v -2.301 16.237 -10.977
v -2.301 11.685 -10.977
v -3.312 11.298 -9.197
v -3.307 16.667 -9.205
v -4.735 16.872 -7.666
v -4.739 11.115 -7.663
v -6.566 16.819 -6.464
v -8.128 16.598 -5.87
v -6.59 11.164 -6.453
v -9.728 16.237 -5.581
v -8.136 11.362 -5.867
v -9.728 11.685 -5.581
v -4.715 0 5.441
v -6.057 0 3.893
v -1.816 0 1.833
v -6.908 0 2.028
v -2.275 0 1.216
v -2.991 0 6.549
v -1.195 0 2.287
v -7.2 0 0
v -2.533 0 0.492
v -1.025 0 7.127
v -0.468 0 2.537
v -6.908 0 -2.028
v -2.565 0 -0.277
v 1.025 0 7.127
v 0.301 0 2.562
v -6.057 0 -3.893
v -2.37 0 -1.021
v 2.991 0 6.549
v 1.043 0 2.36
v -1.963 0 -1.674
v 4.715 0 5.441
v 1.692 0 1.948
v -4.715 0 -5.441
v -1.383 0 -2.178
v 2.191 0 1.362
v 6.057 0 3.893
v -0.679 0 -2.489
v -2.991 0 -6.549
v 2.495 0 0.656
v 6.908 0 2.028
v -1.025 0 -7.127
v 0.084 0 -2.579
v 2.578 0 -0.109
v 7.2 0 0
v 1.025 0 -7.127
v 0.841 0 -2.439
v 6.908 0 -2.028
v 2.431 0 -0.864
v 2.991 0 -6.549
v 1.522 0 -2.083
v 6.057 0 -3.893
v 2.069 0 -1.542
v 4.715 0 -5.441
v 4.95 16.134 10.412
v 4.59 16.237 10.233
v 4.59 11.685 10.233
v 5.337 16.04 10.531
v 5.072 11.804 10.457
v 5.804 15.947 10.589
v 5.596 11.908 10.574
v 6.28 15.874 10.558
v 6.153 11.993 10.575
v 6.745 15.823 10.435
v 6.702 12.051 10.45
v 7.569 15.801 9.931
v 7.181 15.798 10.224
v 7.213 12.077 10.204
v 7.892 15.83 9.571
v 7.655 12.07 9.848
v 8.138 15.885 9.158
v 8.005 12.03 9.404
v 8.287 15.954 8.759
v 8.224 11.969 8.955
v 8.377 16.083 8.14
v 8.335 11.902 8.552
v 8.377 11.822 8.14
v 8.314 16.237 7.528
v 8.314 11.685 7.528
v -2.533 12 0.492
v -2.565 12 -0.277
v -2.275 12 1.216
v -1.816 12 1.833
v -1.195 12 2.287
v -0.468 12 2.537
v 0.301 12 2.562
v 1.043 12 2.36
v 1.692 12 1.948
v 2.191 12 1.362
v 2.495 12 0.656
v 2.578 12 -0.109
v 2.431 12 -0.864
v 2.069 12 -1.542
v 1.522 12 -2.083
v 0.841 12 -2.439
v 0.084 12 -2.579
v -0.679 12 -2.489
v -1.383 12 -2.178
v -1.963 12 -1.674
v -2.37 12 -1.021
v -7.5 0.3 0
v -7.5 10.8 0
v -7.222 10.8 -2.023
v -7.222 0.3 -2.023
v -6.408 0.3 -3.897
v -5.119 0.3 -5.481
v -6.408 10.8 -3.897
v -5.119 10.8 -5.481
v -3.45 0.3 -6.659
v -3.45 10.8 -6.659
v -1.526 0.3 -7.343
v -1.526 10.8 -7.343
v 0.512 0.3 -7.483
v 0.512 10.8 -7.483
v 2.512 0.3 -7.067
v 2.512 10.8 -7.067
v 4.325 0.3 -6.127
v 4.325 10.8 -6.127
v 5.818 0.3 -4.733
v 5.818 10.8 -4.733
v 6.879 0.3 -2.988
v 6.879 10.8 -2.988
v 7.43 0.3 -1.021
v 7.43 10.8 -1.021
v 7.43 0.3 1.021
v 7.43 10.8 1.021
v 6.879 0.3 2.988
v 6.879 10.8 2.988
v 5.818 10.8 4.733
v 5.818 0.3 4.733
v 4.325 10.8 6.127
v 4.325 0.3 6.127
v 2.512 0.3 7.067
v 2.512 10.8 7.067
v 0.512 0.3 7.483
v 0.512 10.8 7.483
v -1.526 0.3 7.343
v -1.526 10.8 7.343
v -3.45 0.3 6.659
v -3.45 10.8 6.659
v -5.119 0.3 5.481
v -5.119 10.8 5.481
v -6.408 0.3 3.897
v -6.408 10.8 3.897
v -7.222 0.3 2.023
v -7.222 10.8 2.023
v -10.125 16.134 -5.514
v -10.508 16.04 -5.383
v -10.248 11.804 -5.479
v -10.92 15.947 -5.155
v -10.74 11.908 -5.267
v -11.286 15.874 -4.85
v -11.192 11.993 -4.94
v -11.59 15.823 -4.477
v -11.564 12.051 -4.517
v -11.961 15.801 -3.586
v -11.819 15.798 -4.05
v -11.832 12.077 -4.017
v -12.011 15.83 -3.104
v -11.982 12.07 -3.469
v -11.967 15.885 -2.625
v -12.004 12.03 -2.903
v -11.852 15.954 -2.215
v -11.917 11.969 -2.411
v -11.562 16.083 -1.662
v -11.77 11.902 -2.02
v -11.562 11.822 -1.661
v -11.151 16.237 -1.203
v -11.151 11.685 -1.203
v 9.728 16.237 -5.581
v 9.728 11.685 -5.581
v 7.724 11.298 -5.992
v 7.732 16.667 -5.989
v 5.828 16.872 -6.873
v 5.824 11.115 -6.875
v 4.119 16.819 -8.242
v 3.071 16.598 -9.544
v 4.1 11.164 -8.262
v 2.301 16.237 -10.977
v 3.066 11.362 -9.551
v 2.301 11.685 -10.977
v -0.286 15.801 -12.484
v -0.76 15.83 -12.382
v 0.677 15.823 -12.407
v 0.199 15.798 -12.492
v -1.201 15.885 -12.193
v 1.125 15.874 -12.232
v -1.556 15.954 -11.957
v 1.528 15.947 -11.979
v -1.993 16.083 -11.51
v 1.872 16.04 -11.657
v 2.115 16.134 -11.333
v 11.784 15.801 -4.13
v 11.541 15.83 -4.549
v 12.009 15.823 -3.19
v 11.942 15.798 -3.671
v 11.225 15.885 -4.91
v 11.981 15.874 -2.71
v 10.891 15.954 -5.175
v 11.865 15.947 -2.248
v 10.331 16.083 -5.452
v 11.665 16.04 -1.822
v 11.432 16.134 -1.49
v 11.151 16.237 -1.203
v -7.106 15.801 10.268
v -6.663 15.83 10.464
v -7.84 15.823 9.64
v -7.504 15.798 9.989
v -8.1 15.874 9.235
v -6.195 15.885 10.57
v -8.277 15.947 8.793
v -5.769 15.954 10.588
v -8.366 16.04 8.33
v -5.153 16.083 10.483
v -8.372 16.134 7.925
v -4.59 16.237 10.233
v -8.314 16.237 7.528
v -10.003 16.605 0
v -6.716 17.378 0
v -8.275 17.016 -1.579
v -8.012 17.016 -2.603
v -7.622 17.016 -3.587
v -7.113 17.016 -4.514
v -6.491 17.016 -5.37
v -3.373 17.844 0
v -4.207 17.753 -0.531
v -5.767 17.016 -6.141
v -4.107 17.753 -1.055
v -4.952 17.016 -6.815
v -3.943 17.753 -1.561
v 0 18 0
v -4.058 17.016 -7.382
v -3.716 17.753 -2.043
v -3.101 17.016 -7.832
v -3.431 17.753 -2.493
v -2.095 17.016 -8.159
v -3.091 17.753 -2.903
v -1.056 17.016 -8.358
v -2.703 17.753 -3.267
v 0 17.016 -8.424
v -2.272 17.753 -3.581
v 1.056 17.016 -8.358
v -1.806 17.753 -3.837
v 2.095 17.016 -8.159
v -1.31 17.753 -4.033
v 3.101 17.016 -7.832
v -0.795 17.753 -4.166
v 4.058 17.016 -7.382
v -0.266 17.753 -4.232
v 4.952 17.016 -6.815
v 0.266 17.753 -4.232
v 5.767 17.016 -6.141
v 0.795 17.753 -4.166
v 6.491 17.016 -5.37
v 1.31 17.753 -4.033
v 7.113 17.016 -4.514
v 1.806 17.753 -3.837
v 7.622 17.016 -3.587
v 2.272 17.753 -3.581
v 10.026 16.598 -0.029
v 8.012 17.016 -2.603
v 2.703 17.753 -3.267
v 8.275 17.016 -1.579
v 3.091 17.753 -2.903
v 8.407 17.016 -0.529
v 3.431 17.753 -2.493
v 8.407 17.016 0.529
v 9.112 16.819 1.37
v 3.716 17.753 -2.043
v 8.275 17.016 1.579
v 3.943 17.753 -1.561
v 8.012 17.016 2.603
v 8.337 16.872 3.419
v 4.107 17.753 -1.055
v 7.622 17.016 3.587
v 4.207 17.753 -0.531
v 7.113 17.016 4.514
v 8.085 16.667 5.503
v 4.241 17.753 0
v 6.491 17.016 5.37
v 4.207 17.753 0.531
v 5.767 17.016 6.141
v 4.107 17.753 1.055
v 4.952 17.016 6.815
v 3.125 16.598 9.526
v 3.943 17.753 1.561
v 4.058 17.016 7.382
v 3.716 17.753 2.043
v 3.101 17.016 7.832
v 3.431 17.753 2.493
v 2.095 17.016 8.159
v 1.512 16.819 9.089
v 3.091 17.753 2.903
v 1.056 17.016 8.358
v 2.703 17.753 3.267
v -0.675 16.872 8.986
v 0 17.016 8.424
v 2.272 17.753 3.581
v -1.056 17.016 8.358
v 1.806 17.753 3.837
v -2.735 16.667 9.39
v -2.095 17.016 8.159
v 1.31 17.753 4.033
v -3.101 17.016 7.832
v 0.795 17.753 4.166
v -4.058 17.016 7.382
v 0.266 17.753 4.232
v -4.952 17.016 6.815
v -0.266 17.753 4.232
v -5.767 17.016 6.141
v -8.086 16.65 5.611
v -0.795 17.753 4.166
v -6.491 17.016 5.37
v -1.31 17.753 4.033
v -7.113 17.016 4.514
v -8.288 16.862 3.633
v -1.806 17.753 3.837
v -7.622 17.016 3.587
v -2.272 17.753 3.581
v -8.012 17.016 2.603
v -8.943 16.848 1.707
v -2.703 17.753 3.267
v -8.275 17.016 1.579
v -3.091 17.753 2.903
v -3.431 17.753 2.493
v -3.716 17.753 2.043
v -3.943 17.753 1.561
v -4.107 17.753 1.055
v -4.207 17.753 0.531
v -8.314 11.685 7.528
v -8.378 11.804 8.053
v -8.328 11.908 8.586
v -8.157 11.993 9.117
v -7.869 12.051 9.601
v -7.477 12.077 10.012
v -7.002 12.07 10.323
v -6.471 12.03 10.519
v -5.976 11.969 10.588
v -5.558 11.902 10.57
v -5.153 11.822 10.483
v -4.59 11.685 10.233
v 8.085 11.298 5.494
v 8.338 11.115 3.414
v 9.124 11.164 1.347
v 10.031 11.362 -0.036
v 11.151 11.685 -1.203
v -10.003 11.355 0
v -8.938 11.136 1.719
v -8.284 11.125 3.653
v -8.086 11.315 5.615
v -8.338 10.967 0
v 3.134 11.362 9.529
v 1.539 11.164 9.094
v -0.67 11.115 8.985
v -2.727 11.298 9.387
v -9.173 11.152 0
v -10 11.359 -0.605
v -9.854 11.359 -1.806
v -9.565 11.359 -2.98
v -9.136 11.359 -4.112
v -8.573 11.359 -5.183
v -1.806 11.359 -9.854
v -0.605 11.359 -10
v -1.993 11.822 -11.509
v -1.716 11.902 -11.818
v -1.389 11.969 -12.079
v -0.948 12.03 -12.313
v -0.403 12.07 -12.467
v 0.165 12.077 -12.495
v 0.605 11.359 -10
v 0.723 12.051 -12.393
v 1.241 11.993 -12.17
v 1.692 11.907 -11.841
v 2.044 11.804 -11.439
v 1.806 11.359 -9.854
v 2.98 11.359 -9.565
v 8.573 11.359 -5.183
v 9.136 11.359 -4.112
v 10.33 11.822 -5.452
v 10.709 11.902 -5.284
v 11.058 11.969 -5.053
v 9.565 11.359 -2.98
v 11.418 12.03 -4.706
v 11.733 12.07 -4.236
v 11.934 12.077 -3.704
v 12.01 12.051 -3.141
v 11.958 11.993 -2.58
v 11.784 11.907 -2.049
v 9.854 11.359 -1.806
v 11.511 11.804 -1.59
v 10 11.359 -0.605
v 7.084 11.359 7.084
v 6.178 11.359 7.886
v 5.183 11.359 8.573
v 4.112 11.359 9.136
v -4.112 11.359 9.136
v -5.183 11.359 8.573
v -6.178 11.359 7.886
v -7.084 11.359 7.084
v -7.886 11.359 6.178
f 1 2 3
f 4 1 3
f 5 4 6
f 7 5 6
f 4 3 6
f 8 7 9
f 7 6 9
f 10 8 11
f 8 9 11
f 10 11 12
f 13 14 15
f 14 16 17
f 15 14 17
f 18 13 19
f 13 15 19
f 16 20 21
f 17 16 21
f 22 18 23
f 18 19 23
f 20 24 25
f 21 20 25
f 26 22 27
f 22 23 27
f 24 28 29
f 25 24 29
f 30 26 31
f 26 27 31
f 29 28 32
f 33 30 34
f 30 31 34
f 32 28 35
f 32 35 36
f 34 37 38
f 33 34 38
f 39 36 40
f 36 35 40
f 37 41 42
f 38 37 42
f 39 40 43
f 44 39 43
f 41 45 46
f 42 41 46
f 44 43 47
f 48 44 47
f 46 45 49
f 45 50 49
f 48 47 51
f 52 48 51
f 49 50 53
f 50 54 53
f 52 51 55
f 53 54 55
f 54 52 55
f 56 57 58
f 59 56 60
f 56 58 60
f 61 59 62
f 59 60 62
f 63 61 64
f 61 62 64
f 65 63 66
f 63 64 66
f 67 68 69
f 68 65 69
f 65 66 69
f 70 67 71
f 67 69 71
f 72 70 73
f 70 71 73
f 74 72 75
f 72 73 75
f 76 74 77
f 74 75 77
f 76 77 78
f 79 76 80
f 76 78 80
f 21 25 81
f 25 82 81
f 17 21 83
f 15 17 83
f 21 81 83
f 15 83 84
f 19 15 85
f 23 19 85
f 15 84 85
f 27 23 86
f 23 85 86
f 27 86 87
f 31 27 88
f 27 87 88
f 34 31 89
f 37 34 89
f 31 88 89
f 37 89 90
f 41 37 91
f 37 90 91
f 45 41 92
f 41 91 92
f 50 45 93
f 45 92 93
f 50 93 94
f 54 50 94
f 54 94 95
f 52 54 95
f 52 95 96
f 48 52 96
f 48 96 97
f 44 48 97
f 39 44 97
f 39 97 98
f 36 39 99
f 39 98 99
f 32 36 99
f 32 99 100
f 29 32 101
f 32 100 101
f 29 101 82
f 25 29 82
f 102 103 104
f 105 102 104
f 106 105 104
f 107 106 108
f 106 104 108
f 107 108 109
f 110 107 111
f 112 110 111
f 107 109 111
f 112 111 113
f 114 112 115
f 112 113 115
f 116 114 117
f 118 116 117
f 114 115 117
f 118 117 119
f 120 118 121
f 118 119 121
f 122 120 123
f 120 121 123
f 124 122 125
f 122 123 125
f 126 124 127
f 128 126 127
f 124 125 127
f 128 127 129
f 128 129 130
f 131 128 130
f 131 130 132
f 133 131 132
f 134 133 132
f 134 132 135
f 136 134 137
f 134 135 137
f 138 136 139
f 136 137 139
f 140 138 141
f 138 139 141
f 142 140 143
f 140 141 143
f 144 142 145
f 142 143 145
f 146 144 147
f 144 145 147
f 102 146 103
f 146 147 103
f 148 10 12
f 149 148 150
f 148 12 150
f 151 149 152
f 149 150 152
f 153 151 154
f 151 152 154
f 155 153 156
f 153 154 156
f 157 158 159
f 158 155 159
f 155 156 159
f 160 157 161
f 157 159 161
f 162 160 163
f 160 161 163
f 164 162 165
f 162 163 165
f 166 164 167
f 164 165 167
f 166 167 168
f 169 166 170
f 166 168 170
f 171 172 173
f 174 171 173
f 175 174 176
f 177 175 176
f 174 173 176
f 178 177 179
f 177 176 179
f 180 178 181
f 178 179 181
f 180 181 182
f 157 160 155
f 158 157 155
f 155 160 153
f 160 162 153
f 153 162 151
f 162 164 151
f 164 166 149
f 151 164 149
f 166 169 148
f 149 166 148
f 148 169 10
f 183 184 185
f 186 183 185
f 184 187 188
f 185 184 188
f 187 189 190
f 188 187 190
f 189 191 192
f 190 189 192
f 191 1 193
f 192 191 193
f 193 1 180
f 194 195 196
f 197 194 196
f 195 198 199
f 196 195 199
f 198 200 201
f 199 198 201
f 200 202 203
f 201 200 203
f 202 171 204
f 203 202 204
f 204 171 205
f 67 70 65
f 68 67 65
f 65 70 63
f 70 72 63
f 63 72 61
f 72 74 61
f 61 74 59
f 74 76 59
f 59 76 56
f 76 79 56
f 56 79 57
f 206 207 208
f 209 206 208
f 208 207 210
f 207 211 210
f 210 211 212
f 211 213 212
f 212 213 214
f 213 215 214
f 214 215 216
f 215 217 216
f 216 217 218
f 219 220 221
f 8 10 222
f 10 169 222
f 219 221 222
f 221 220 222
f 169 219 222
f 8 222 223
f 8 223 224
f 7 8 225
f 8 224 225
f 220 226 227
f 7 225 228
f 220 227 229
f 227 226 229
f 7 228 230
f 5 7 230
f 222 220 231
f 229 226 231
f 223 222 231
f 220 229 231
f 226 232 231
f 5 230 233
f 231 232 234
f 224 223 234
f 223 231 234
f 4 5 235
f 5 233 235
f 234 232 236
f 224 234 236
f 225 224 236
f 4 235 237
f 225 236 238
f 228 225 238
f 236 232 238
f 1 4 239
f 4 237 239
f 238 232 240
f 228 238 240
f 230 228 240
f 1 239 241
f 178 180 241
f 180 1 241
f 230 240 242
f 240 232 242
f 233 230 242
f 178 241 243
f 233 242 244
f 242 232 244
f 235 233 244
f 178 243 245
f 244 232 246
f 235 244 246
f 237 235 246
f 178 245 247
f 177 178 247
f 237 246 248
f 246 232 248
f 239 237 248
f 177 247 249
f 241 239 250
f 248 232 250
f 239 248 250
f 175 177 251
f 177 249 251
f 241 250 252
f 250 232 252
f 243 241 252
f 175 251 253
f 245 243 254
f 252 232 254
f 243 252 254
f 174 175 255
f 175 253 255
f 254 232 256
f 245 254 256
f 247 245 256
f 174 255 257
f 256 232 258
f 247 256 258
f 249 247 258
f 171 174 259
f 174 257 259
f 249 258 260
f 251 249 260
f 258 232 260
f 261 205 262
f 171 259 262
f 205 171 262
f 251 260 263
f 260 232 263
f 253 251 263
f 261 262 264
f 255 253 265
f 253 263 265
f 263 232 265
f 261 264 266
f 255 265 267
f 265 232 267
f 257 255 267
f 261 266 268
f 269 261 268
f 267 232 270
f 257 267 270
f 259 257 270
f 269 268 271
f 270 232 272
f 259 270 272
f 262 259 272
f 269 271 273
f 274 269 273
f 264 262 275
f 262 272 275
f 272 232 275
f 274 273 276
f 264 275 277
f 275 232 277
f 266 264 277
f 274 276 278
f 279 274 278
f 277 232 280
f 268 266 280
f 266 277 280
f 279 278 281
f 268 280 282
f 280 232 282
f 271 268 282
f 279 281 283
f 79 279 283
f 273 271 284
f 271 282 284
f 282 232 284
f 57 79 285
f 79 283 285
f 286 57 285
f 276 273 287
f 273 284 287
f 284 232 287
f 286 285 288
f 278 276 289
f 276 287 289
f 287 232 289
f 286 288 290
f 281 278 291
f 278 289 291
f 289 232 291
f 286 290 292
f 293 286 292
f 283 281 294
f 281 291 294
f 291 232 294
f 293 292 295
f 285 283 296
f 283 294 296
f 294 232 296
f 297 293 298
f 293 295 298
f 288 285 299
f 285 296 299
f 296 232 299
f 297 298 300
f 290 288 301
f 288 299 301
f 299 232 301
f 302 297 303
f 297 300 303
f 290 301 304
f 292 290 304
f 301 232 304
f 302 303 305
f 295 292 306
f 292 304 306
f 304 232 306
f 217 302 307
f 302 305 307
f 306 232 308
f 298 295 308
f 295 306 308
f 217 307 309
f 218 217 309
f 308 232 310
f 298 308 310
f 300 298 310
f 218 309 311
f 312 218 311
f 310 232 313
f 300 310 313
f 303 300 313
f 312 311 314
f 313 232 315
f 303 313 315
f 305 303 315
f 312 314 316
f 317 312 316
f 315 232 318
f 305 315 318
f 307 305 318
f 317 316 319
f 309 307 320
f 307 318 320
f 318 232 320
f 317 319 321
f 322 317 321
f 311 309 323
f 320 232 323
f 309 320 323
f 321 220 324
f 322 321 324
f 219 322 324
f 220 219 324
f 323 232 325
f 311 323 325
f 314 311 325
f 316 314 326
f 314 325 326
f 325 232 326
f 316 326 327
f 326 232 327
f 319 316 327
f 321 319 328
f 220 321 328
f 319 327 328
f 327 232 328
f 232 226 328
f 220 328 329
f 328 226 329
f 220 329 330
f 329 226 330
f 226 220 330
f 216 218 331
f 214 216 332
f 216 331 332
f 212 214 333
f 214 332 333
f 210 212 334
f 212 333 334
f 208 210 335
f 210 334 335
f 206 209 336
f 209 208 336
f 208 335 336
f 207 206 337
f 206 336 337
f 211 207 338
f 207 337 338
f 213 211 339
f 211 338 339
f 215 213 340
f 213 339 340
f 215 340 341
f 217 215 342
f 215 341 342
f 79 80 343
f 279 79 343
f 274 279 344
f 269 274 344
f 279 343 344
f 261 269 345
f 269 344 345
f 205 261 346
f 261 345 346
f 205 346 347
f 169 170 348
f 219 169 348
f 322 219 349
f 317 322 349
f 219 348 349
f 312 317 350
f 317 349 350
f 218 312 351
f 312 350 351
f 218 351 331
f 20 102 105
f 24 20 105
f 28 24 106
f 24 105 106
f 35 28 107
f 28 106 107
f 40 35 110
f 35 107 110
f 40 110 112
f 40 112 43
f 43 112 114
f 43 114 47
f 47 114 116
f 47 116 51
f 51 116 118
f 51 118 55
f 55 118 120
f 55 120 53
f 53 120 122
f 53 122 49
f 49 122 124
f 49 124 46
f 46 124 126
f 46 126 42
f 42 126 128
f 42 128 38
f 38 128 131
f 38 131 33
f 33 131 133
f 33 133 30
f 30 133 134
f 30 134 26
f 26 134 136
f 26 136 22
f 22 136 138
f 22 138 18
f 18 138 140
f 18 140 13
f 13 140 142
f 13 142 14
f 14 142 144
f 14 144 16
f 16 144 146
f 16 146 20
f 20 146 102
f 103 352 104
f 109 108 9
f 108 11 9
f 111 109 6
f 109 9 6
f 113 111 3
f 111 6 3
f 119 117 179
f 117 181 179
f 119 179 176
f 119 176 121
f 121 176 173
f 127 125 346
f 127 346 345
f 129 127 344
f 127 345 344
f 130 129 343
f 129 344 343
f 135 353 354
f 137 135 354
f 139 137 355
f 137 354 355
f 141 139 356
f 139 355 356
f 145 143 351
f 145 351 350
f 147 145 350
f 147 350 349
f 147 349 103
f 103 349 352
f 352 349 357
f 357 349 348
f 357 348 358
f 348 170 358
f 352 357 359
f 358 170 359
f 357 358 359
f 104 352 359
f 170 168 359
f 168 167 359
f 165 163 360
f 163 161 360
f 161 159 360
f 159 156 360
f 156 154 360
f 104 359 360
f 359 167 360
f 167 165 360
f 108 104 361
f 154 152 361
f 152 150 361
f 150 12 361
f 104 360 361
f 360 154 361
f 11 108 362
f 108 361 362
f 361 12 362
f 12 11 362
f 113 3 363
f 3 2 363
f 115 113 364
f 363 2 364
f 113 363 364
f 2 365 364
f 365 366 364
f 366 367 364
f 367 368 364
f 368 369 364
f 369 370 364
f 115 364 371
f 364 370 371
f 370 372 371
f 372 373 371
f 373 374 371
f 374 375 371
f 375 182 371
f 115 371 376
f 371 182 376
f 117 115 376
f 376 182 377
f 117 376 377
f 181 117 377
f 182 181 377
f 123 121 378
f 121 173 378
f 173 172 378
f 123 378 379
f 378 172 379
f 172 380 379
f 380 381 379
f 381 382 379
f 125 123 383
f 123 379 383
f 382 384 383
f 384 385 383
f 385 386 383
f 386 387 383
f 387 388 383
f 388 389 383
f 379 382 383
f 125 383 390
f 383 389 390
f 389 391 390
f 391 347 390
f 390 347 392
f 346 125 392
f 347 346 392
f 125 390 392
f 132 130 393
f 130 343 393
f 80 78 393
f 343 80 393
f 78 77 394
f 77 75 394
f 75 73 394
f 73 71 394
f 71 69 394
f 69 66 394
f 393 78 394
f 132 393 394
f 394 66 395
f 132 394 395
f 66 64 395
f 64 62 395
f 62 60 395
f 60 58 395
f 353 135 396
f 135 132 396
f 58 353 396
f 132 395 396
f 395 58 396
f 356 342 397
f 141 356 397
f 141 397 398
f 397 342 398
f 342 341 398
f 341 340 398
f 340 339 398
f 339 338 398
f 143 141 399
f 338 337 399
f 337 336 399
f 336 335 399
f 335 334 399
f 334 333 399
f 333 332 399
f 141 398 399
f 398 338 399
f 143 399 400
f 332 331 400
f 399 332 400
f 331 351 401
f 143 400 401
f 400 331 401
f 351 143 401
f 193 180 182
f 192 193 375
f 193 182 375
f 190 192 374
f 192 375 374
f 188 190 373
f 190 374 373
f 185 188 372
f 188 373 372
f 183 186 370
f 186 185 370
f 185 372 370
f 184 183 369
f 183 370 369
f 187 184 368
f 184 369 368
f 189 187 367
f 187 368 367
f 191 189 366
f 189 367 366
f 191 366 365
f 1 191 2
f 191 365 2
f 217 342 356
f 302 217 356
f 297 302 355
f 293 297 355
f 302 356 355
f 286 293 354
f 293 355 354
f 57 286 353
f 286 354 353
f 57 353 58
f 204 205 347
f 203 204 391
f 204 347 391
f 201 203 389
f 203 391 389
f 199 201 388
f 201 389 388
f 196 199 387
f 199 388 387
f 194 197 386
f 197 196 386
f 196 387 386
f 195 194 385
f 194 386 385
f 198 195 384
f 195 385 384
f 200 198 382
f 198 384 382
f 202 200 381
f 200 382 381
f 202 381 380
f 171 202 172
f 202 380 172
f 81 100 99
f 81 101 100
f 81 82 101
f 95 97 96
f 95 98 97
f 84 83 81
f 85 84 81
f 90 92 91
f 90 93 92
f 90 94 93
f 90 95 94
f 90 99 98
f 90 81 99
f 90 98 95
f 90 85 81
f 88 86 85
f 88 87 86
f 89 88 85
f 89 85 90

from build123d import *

# Parameters (mm, degrees)
SKETCH_2_R          = 13.5
CUT_EXTRUDE_1_DEPTH = 26.228951623
SKETCH_3_W          = 2.58
SKETCH_3_H          = 12
CHAMFER_1_SIZE      = 0.3


with BuildPart() as part:
    # 草图1 → 旋转1 (revolve)
    with BuildSketch(Plane.XY):
        with BuildLine():
            Line((0, 0), (-7.5, 0))
            Line((-7.5, 0), (-7.5, 10.8))
            ThreePointArc((-7.5, 10.8), (-10.020409182, 11.359397565), (-12.5, 12.078436826))
            Line((-12.5, 12.078436826), (-12.5, 15.795912741))
            ThreePointArc((-12.5, 15.795912741), (-6.346416324, 17.444760518), (0, 18))
            Line((0, 18), (0, 0))
        make_face()
    revolve(axis=Axis((0, 18, 0), (0, -1, 0)))

    # 草图2 → 切除-拉伸1 (cut, through all)
    with BuildSketch(Plane(origin=(0, 0, 0), x_dir=(1, 0, 0), z_dir=(0, 1, 0))):
        Circle(SKETCH_2_R)
        with BuildLine():
            ThreePointArc((2.301292124, 10.976757166), (0, 12.5), (-2.301292124, 10.976757166))
            ThreePointArc((-2.301292124, 10.976757166), (-5.266555861, 7.24879227), (-9.728378055, 5.580663378))
            ThreePointArc((-9.728378055, 5.580663378), (-11.888206454, 3.86271243), (-11.150654806, 1.203345637))
            ThreePointArc((-11.150654806, 1.203345637), (-8.521466386, -2.76879227), (-8.313760417, -7.527717519))
            ThreePointArc((-8.313760417, -7.527717519), (-7.347315654, -10.11271243), (-4.590191543, -10.233048662))
            ThreePointArc((-4.590191543, -10.233048662), (0, -8.96), (4.590191543, -10.233048662))
            ThreePointArc((4.590191543, -10.233048662), (7.347315654, -10.11271243), (8.313760417, -7.527717519))
            ThreePointArc((8.313760417, -7.527717519), (8.521466386, -2.76879227), (11.150654806, 1.203345637))
            ThreePointArc((11.150654806, 1.203345637), (11.888206454, 3.86271243), (9.728378055, 5.580663378))
            ThreePointArc((9.728378055, 5.580663378), (5.266555861, 7.24879227), (2.301292124, 10.976757166))
        make_face(mode=Mode.SUBTRACT)
    extrude(amount=CUT_EXTRUDE_1_DEPTH, mode=Mode.SUBTRACT)

    # 草图3 → 切除-旋转1 (revolve, cut)
    with BuildSketch(Plane.XY, mode=Mode.PRIVATE) as cut_revolve_1_sk:
        with Locations((1.29, 6)):
            Rectangle(SKETCH_3_W, SKETCH_3_H)
    revolve(cut_revolve_1_sk.sketch.rotate(Axis((0, 0, 0), (0, 1, 0)), 173.840646027), axis=Axis((0, 0, 0), (0, 1, 0)), mode=Mode.SUBTRACT)

    # 倒角1
    chamfer_1_edges = [part.edges().sort_by_distance(p)[0] for p in [
        (7.5, 0, 0),
    ]]
    chamfer(chamfer_1_edges, length=CHAMFER_1_SIZE)


solid = part.part
